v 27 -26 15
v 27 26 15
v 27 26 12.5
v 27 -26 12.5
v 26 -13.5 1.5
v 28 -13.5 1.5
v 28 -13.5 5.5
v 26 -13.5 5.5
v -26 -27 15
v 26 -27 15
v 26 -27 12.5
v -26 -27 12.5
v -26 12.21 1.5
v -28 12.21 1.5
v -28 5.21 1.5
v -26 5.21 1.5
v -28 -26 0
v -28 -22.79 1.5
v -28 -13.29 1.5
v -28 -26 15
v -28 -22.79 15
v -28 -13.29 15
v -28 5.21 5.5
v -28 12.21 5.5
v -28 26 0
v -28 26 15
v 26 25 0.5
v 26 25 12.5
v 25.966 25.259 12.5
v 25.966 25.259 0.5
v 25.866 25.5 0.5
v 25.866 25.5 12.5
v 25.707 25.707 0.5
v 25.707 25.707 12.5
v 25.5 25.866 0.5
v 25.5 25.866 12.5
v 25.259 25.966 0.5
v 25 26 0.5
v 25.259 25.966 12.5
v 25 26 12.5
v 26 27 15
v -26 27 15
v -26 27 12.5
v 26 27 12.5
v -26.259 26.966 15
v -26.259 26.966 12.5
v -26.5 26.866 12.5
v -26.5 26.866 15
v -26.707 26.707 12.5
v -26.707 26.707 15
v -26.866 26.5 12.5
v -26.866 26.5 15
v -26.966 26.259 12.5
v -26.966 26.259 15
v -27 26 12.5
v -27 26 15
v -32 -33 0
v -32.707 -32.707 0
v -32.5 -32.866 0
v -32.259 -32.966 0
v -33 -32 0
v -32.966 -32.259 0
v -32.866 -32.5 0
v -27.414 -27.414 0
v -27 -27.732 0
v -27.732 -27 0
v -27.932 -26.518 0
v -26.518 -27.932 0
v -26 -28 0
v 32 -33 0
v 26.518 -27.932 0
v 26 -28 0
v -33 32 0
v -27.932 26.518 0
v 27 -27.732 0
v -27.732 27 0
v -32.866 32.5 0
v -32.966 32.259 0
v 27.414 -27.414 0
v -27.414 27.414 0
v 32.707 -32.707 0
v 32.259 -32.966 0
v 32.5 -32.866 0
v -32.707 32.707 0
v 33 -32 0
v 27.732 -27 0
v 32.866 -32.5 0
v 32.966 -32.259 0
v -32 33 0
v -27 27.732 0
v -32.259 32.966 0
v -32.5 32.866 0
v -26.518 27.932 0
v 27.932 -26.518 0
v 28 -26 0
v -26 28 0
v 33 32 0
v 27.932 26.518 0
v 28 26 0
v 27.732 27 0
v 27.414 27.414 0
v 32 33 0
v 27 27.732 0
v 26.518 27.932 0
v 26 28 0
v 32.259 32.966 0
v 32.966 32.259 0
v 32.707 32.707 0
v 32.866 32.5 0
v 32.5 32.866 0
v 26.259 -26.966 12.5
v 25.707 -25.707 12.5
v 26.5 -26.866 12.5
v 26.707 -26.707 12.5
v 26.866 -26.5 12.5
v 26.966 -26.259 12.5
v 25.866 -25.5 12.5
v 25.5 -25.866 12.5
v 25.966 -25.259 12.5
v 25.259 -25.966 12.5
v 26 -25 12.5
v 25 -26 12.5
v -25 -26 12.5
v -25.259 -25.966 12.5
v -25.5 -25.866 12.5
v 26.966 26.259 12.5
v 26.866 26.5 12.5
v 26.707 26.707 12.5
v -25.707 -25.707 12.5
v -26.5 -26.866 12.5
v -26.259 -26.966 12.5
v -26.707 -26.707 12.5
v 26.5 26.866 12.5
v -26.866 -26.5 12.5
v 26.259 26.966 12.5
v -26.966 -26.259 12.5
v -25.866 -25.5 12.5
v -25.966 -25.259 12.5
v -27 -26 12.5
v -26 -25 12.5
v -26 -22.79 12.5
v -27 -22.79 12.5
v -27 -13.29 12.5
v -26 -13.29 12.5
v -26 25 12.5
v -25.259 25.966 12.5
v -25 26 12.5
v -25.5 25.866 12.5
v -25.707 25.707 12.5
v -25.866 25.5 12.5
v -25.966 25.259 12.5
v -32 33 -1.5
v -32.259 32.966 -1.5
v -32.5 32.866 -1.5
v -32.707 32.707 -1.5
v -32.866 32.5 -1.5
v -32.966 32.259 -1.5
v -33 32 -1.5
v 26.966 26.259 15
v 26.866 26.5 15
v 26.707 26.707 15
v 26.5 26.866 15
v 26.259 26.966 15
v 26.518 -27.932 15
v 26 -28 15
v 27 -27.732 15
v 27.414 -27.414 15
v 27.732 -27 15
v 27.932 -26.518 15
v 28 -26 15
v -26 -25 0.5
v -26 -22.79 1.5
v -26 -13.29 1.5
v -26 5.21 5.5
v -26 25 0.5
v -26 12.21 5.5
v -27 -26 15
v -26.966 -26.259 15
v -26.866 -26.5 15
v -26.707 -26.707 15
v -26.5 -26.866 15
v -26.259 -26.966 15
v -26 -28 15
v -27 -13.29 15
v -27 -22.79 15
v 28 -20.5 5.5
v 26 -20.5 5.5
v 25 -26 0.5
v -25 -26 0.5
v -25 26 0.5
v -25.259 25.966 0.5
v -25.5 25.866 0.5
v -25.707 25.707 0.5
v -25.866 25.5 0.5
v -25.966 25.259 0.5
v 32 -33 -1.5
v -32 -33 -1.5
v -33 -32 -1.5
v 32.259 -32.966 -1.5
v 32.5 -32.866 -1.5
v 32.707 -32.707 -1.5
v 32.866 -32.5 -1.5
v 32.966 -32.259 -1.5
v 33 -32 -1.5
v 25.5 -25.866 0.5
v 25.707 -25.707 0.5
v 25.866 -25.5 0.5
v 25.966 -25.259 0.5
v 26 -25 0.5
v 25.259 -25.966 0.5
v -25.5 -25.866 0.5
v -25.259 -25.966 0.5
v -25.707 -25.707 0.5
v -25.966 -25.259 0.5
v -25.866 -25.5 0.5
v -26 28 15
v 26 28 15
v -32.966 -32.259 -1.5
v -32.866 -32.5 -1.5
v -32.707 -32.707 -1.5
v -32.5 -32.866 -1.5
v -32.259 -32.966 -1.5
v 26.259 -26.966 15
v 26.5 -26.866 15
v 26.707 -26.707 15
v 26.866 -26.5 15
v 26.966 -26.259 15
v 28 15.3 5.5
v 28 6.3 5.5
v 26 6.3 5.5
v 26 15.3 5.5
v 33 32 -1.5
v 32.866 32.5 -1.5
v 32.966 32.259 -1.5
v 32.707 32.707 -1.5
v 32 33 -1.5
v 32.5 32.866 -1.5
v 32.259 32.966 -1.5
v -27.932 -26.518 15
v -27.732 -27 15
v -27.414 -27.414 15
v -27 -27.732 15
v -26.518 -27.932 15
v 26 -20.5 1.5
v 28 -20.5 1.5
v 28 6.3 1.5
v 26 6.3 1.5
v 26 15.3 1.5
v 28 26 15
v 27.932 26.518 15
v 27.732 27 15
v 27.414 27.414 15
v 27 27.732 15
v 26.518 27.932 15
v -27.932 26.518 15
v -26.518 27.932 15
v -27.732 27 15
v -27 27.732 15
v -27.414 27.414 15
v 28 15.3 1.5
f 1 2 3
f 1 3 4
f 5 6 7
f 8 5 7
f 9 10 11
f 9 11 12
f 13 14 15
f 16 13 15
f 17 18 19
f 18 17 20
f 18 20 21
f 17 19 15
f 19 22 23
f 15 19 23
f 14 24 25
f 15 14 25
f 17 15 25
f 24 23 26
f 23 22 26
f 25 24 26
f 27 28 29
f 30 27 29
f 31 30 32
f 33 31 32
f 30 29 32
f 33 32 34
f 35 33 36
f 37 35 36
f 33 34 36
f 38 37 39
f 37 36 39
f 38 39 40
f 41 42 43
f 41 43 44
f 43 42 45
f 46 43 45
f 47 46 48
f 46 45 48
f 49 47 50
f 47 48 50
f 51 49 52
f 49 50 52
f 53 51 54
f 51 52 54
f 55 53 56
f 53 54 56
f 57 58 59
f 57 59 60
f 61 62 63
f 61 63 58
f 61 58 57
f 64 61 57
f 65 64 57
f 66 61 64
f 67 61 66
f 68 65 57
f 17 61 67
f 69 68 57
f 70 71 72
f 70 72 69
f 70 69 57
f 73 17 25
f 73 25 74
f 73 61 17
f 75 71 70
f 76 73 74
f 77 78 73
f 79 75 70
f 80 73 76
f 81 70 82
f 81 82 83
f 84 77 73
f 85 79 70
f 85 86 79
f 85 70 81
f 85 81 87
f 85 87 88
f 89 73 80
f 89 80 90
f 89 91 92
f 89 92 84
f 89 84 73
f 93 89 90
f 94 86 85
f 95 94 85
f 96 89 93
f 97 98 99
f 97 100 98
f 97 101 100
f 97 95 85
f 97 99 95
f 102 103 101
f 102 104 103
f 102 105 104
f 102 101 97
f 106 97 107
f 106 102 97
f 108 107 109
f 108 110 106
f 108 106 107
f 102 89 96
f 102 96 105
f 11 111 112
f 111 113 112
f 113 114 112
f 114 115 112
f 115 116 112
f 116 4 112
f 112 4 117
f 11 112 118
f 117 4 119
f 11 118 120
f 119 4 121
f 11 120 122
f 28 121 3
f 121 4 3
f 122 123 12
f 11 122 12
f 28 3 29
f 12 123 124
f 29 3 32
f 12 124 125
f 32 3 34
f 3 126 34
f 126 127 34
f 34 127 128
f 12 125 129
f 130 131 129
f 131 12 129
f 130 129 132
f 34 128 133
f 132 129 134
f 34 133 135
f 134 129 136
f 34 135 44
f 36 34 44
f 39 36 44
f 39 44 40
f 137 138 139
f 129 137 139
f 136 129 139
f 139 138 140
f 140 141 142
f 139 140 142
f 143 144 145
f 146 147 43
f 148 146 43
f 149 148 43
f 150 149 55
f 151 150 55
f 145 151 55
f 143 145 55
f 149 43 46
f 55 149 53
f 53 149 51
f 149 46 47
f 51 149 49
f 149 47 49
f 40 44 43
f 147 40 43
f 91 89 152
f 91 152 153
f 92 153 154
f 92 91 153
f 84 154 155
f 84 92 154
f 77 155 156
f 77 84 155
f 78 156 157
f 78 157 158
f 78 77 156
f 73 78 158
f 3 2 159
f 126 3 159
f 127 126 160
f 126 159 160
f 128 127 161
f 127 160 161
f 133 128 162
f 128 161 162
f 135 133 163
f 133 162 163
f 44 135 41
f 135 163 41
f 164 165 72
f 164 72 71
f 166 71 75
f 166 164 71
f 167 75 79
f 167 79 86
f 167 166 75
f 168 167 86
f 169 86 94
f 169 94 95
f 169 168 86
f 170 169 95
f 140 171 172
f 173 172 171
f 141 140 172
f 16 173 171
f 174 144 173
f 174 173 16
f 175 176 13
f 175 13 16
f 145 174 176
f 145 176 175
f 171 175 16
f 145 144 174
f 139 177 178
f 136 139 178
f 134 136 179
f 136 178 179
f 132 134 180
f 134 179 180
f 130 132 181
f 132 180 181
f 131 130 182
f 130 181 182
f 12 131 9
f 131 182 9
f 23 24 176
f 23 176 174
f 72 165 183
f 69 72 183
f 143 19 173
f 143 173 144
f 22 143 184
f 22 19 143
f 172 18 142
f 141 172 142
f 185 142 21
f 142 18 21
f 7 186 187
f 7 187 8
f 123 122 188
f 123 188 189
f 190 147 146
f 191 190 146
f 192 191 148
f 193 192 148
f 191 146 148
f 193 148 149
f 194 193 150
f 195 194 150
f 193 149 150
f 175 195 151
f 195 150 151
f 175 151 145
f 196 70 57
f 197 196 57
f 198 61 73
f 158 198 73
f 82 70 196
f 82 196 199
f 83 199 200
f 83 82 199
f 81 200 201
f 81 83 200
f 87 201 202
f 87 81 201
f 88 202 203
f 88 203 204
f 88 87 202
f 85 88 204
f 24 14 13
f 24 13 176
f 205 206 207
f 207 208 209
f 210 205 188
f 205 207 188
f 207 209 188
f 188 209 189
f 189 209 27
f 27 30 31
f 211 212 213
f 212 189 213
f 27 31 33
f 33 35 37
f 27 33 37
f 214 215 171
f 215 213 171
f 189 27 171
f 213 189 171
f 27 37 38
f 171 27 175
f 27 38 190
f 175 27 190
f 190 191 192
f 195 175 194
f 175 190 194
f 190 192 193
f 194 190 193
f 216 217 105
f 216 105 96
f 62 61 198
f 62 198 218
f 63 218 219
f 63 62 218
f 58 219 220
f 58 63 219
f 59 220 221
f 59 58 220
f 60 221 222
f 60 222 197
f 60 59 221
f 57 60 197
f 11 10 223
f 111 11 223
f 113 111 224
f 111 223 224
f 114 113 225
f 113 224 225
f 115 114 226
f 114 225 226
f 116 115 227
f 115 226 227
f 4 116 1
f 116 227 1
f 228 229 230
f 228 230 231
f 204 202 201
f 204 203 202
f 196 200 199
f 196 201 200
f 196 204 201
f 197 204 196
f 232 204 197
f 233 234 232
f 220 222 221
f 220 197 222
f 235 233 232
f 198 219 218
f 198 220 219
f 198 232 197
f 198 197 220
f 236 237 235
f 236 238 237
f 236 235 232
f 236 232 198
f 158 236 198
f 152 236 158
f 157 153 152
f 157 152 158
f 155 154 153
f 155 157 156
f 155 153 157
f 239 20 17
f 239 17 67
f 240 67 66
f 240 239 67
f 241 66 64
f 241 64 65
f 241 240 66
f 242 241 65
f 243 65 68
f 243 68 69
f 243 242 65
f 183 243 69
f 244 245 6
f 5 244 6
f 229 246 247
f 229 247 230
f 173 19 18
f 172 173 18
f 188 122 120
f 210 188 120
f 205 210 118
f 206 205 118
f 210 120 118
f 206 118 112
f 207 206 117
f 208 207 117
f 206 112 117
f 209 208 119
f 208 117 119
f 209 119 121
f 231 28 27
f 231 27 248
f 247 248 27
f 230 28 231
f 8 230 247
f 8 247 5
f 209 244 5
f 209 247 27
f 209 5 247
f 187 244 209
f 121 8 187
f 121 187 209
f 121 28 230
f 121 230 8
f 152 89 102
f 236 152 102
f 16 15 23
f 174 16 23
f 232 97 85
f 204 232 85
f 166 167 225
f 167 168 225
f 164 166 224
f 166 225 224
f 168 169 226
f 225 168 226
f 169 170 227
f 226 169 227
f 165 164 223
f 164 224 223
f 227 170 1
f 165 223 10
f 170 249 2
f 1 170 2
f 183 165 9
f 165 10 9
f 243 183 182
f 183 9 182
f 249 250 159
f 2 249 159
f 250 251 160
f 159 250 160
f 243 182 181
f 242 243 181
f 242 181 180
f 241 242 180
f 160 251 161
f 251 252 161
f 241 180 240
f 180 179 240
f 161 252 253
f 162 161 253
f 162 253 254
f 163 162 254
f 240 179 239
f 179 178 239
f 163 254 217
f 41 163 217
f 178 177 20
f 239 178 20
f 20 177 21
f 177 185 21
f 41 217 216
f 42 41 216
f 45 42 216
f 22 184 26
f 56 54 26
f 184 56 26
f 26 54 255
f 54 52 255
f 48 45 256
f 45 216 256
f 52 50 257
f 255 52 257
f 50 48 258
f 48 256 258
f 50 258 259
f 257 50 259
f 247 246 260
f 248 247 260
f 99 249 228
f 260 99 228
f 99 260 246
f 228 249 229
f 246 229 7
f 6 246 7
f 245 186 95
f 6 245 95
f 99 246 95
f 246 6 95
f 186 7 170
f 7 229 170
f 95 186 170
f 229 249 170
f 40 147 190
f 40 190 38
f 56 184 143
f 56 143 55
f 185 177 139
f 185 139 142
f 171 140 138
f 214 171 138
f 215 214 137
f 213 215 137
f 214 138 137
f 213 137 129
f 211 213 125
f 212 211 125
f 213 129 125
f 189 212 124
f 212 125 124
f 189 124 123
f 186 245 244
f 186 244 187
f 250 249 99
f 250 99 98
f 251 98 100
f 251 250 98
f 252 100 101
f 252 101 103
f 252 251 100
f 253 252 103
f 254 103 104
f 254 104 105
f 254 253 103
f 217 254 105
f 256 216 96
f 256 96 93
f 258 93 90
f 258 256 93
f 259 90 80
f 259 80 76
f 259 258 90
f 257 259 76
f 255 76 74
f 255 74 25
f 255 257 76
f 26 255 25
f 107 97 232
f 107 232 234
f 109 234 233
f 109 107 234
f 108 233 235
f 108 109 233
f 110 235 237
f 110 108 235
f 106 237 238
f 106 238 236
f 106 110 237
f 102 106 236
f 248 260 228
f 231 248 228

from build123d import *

# Parameters (mm, degrees)
PAD_DEPTH       = 15
PAD_DEPTH_BACK  = 1.5
POCKET_DEPTH    = 2.5
POCKET001_DEPTH = 12
SKETCH003_W     = 9.5
SKETCH003_H     = 13.5
POCKET002_DEPTH = 7
SKETCH004_W     = 7
SKETCH004_H     = 4
POCKET003_DEPTH = 7
SKETCH006_W     = 7
SKETCH006_H     = 4
SKETCH006_W_2   = 9
POCKET004_DEPTH = 7
SKETCH007_W     = 66
SKETCH007_H     = 66
POCKET005_DEPTH = 15


with BuildPart() as part:
    # Sketch → Pad (new body, two sides)
    with BuildSketch(Plane.XY) as pad_sk:
        with BuildLine():
            Line((-32, 33), (32, 33))
            ThreePointArc((33, 32), (32.707107, 32.707107), (32, 33))
            Line((33, 32), (33, -32))
            ThreePointArc((32, -33), (32.707107, -32.707107), (33, -32))
            Line((32, -33), (-32, -33))
            ThreePointArc((-33, -32), (-32.707107, -32.707107), (-32, -33))
            Line((-33, -32), (-33, 32))
            ThreePointArc((-32, 33), (-32.707107, 32.707107), (-33, 32))
        make_face()
    extrude(amount=PAD_DEPTH)
    extrude(pad_sk.sketch, amount=-PAD_DEPTH_BACK)

    # Sketch001 (on Face10 of Pad) → Pocket (cut)
    with BuildSketch(Plane.XY.offset(15)):
        with BuildLine():
            Line((-26, 27), (26, 27))
            ThreePointArc((27, 26), (26.707107, 26.707107), (26, 27))
            Line((27, 26), (27, -26))
            ThreePointArc((26, -27), (26.707107, -26.707107), (27, -26))
            Line((26, -27), (-26, -27))
            ThreePointArc((-27, -26), (-26.707107, -26.707107), (-26, -27))
            Line((-27, -26), (-27, 26))
            ThreePointArc((-26, 27), (-26.707107, 26.707107), (-27, 26))
        make_face()
    extrude(amount=-POCKET_DEPTH, mode=Mode.SUBTRACT)

    # Sketch002 (on Face19 of Pocket) → Pocket001 (cut)
    with BuildSketch(Plane.XY.offset(12.5)):
        with BuildLine():
            Line((-25, 26), (25, 26))
            ThreePointArc((26, 25), (25.707107, 25.707107), (25, 26))
            Line((26, 25), (26, -25))
            ThreePointArc((25, -26), (25.707107, -25.707107), (26, -25))
            Line((25, -26), (-25, -26))
            ThreePointArc((-26, -25), (-25.707107, -25.707107), (-25, -26))
            Line((-26, -25), (-26, 25))
            ThreePointArc((-25, 26), (-25.707107, 25.707107), (-26, 25))
        make_face()
    extrude(amount=-POCKET001_DEPTH, mode=Mode.SUBTRACT)

    # Sketch003 (on Face1 of Pocket001) → Pocket002 (cut)
    with BuildSketch(Plane(origin=(-33, 0, 0), x_dir=(0, -1, 0), z_dir=(-1, 0, 0))):
        with Locations((18.04, 8.25)):
            Rectangle(SKETCH003_W, SKETCH003_H)
    extrude(amount=-POCKET002_DEPTH, mode=Mode.SUBTRACT)

    # Sketch004 (on Face1 of Pocket002) → Pocket003 (cut)
    with BuildSketch(Plane(origin=(-33, 0, 0), x_dir=(0, -1, 0), z_dir=(-1, 0, 0))):
        with Locations((-8.71, 3.5)):
            Rectangle(SKETCH004_W, SKETCH004_H)
    extrude(amount=-POCKET003_DEPTH, mode=Mode.SUBTRACT)

    # Sketch006 (on Face15 of Pocket003) → Pocket004 (cut)
    with BuildSketch(Plane.YZ.offset(33)):
        with Locations((-17, 3.5)):
            Rectangle(SKETCH006_W, SKETCH006_H)
        with Locations((10.8, 3.5)):
            Rectangle(SKETCH006_W_2, SKETCH006_H)
    extrude(amount=-POCKET004_DEPTH, mode=Mode.SUBTRACT)

    # Sketch007 (on Face5 of Pocket004) → Pocket005 (cut)
    with BuildSketch(Plane.XY.offset(15)):
        Rectangle(SKETCH007_W, SKETCH007_H)
        with BuildLine():
            Line((28, 26), (28, -26))
            ThreePointArc((26, -28), (27.414214, -27.414214), (28, -26))
            Line((26, -28), (-26, -28))
            ThreePointArc((-28, -26), (-27.414214, -27.414214), (-26, -28))
            Line((-28, -26), (-28, 26))
            ThreePointArc((-26, 28), (-27.414214, 27.414214), (-28, 26))
            Line((26, 28), (-26, 28))
            ThreePointArc((28, 26), (27.414214, 27.414214), (26, 28))
        make_face(mode=Mode.SUBTRACT)
    extrude(amount=-POCKET005_DEPTH, mode=Mode.SUBTRACT)


solid = part.part
